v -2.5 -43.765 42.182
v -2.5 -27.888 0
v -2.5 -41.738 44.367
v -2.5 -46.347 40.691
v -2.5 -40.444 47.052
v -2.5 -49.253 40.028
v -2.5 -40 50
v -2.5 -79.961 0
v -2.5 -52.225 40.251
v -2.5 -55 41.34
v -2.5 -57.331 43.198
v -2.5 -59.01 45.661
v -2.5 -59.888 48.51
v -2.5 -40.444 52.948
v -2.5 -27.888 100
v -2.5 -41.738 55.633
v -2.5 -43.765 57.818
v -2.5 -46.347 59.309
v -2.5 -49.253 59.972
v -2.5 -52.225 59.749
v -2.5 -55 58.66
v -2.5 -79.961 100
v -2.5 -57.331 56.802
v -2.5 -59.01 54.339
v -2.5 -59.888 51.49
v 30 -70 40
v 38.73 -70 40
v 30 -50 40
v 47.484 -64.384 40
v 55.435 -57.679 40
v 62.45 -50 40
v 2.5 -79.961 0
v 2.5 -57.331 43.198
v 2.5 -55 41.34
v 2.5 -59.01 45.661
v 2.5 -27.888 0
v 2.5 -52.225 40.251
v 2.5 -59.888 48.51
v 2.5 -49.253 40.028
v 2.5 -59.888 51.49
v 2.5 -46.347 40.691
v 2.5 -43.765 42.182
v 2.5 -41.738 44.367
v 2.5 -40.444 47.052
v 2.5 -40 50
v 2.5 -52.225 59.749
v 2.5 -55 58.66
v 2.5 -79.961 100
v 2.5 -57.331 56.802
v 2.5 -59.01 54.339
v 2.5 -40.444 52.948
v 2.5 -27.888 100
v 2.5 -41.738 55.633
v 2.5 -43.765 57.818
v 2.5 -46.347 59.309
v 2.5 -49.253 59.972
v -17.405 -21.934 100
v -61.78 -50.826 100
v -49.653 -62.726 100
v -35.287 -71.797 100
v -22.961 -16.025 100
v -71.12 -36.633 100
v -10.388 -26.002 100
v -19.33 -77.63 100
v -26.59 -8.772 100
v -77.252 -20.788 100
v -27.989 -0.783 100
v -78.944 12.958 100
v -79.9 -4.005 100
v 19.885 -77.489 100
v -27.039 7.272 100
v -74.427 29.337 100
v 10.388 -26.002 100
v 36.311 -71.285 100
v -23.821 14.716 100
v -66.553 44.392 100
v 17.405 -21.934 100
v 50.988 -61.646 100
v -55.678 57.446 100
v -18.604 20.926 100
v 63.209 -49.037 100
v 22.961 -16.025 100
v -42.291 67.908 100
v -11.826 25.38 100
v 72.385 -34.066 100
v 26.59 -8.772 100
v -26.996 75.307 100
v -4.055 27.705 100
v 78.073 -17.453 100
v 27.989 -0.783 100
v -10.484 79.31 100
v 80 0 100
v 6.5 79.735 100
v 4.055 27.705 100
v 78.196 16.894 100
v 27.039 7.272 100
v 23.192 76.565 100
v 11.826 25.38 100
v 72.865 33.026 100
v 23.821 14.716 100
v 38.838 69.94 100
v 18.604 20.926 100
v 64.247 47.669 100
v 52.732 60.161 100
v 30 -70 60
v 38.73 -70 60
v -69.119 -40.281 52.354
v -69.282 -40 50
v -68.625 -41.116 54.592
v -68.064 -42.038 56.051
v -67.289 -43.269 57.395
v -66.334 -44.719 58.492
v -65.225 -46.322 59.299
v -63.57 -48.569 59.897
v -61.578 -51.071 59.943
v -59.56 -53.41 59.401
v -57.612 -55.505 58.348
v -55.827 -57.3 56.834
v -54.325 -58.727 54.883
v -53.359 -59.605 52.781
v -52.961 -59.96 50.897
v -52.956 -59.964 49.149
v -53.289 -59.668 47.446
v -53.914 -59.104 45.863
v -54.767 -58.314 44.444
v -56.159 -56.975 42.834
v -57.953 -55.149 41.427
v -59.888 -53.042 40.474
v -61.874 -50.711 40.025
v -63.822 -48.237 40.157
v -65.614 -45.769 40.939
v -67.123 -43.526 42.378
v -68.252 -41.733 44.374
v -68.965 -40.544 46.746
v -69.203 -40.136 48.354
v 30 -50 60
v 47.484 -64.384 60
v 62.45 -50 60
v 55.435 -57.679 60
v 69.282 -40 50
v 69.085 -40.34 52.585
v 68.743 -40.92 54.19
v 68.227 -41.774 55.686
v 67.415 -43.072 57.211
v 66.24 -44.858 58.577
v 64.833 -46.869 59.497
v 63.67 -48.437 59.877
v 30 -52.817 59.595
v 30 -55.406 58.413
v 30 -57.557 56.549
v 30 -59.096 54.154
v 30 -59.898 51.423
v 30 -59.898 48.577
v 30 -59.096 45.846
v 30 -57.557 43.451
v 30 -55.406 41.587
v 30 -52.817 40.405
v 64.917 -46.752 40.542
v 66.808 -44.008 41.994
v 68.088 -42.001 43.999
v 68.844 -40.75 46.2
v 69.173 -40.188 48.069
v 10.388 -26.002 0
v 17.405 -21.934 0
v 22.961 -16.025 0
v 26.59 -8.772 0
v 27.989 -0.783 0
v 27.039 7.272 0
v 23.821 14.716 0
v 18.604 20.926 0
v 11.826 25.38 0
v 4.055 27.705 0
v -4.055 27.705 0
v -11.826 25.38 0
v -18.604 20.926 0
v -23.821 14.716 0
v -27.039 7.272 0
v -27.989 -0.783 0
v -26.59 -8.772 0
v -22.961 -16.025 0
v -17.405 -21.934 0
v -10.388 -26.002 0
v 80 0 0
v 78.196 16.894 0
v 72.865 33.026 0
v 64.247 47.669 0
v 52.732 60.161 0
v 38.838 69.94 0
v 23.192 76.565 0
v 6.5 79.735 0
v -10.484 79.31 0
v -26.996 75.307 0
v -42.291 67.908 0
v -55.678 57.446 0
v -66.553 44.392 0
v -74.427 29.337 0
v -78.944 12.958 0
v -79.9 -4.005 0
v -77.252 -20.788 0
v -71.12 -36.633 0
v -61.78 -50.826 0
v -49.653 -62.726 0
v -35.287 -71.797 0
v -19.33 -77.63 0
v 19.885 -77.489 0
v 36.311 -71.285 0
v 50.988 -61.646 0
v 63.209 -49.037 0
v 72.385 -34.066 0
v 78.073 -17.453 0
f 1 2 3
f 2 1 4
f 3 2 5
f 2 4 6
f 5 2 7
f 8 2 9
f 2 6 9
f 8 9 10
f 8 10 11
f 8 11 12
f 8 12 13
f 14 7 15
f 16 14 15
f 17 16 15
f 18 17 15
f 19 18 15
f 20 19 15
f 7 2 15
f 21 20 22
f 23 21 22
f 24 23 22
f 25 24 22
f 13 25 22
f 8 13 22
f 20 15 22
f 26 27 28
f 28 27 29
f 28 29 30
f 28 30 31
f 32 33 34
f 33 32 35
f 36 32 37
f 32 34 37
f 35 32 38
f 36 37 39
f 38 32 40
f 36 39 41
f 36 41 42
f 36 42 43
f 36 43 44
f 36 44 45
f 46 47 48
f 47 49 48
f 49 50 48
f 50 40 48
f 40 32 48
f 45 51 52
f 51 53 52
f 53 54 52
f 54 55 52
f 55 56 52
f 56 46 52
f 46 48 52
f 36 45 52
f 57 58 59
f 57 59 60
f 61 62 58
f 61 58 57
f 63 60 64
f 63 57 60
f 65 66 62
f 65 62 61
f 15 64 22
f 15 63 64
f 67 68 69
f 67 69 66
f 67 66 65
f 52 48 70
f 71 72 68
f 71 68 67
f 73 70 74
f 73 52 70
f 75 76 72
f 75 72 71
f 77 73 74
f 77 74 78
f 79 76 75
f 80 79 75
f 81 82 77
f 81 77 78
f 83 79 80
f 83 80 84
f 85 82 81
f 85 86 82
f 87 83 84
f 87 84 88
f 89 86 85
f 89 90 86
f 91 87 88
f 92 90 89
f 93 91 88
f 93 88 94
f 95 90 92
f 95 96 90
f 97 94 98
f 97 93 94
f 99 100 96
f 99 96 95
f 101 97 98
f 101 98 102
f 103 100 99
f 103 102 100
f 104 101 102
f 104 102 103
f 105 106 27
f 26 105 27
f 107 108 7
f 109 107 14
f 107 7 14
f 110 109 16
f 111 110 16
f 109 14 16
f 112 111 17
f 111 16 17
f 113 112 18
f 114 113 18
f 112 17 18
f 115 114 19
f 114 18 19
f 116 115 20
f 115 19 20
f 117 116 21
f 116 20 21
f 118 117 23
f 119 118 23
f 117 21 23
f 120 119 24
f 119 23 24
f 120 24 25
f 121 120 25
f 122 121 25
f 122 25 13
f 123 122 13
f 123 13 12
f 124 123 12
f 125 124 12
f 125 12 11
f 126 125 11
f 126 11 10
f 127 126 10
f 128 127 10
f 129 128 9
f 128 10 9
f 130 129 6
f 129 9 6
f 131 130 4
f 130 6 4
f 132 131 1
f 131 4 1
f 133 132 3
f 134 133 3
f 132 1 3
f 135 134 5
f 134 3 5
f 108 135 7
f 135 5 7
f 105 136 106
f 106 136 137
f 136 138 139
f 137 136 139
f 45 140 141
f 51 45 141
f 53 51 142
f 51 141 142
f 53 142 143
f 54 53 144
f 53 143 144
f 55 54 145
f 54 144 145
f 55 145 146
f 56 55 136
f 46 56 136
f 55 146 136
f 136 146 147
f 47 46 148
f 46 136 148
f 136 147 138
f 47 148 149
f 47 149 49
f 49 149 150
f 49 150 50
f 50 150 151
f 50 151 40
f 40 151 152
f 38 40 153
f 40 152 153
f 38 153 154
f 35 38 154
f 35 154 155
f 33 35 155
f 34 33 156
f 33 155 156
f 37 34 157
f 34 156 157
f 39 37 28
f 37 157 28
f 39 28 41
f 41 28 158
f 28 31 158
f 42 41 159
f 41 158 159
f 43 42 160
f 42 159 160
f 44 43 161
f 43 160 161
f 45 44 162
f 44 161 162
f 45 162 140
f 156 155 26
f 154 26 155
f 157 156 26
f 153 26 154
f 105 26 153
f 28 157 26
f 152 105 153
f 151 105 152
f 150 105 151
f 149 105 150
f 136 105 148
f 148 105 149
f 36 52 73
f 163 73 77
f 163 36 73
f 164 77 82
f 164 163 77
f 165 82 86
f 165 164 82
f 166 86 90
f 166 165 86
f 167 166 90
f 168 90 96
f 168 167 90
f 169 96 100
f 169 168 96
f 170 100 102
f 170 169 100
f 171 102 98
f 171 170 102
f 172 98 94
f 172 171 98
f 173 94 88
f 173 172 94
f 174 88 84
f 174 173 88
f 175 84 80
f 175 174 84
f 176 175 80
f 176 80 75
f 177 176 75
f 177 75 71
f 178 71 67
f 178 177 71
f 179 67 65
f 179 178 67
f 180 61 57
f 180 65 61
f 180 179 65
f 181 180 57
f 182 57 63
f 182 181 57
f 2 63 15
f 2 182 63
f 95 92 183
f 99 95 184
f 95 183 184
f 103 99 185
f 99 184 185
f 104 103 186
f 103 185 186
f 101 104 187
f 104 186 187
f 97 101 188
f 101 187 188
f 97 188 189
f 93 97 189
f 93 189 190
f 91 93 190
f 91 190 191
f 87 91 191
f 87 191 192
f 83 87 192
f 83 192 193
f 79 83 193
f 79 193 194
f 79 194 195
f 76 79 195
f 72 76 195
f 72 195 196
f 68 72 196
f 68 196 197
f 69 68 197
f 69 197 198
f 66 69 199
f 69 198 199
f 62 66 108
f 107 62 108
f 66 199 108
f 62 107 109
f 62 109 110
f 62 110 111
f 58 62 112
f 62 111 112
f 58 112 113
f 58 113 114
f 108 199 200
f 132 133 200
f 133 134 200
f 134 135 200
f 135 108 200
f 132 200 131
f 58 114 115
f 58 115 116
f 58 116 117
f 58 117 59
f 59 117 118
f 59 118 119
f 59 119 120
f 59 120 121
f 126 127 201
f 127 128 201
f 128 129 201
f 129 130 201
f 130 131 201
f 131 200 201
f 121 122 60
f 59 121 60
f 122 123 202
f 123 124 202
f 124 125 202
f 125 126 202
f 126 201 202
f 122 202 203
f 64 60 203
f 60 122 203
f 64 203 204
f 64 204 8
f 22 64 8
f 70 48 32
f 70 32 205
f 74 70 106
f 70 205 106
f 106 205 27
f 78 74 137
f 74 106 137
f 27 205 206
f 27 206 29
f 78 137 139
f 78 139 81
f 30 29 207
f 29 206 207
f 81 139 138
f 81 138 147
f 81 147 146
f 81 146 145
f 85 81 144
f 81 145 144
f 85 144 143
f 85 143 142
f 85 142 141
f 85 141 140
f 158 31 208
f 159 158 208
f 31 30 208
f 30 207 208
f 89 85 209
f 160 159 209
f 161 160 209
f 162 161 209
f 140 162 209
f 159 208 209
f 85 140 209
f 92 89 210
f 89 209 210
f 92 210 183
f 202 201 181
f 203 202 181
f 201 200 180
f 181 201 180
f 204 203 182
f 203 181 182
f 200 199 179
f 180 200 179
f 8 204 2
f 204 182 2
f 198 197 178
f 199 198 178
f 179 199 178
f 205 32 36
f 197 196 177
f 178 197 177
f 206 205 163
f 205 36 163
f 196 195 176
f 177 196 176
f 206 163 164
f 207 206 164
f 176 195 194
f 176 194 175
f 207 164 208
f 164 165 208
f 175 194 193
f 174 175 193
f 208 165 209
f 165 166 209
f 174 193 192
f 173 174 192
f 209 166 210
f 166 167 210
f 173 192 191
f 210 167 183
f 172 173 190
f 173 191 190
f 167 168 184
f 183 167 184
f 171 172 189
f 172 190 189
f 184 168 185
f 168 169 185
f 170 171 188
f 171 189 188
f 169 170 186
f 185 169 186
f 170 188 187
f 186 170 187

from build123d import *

# Parameters (mm, degrees)
F0_R     = 80
F0_R_2   = 28
F1_DEPTH = 100
F2_R     = 10
F3_DEPTH = 250
F5_DEPTH = 100.0010001
F8_DEPTH = 50


with BuildPart() as f1:
    # F0 (on Top) → F1 (new body)
    with BuildSketch(Plane.XY):
        Circle(F0_R)
        Circle(F0_R_2, mode=Mode.SUBTRACT)
    extrude(amount=F1_DEPTH)

    # F2 (on Right) → F3 (cut, symmetric)
    with BuildSketch(Plane.YZ):
        with Locations((-50, 50)):
            Circle(F2_R)
    extrude(amount=F3_DEPTH, both=True, mode=Mode.SUBTRACT)

    # F4 (on face) → F5 (cut, through all)
    with BuildSketch(Plane.XY.offset(100)):
        with BuildLine():
            ThreePointArc((2.5, -27.8881695348), (0, -28), (-2.5, -27.8881695348))
            Line((-2.5, -27.8881695348), (-2.5, -79.9609279586))
            ThreePointArc((-2.5, -79.9609279586), (0, -80), (2.5, -79.9609279586))
            Line((2.5, -79.9609279586), (2.5, -27.8881695348))
        make_face()
    extrude(amount=-F5_DEPTH, mode=Mode.SUBTRACT)

    # F7 (on offset) → F8 (cut)
    with BuildSketch(Plane.YZ.offset(80)):
        with BuildLine():
            ThreePointArc((-50, 40), (-60, 50), (-50, 60))
            Line((-50, 60), (-70, 60))
            Line((-70, 60), (-70, 40))
            Line((-70, 40), (-50, 40))
        make_face()
    extrude(amount=-F8_DEPTH, mode=Mode.SUBTRACT)


solid = f1.part
